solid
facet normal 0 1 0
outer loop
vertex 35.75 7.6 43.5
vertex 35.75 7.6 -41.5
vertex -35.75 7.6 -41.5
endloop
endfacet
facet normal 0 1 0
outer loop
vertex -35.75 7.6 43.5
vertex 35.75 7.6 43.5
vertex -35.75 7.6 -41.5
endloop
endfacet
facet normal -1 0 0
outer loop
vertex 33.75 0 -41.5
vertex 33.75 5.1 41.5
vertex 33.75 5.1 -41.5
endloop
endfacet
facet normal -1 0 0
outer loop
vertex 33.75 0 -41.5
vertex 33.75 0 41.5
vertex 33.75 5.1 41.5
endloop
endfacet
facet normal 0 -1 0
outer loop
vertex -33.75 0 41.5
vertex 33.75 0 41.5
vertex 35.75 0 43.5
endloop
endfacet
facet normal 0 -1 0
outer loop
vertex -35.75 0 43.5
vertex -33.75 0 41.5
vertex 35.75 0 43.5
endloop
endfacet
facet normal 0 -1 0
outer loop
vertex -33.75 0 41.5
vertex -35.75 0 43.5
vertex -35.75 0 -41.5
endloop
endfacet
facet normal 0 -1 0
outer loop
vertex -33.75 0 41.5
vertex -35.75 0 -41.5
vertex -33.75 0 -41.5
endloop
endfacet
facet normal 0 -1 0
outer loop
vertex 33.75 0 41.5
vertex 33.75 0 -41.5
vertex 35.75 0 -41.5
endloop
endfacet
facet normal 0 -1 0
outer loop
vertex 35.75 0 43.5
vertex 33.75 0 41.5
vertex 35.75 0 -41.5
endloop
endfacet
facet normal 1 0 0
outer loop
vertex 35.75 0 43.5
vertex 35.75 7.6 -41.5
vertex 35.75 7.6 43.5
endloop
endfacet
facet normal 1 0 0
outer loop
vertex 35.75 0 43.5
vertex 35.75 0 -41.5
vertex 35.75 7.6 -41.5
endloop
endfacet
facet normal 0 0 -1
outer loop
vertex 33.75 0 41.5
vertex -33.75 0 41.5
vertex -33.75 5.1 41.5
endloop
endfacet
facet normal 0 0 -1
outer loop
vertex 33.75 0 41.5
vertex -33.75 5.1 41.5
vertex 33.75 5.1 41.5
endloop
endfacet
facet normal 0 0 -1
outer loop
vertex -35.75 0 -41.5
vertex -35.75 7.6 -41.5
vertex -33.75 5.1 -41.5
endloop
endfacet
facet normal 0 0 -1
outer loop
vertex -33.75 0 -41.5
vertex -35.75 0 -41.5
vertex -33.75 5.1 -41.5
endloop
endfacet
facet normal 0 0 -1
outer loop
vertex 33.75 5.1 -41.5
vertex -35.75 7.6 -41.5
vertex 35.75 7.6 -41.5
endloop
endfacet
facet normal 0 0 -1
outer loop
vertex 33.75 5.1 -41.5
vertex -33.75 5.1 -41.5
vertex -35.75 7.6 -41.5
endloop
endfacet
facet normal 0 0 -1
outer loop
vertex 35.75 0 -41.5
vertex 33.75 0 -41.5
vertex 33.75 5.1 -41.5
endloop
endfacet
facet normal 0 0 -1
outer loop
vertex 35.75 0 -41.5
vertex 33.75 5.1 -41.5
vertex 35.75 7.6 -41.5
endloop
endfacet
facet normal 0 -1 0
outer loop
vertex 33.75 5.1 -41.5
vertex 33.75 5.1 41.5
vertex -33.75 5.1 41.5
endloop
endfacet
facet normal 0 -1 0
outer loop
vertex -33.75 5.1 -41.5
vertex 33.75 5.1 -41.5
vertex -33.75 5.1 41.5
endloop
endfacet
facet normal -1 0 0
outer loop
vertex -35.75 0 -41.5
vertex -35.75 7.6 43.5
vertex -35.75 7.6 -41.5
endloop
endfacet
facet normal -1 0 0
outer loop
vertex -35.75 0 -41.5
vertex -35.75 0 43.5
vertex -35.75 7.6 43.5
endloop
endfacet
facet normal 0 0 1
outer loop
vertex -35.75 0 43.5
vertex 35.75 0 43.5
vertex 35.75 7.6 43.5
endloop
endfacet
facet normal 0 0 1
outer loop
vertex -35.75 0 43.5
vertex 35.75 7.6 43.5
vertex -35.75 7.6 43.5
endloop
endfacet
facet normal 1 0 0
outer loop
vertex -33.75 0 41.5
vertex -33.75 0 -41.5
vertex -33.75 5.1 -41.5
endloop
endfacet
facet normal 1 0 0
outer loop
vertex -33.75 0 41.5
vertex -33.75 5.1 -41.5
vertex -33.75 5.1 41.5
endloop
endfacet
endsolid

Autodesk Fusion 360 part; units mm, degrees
sketch "Sketch1" plane through (0, 0, 0) normal (0, 1, 0) x (1, 0, 0)
  line L0 (-35.75, 41.5) -> (-33.75, 41.5)
  line L1 (-33.75, 41.5) -> (-33.75, -41.5)
  line L2 (-33.75, -41.5) -> (33.75, -41.5)
  line L3 (33.75, -41.5) -> (33.75, 41.5)
  line L4 (33.75, 41.5) -> (35.75, 41.5)
  line L5 (35.75, 41.5) -> (35.75, -43.5)
  line L6 (35.75, -43.5) -> (-35.75, -43.5)
  line L7 (-35.75, -43.5) -> (-35.75, 41.5)
  dimension "d1" = 2
  dimension "d2" = 2
  dimension "d3" = 2
  dimension "d4" = 67.5
  dimension "d5" = 83
  dimension "d6" = 33.75
  dimension "d7" = 41.5
extrude "Extrude1" add sketch "Sketch1" along normal blind 5.1
sketch "Sketch2" plane through (0, 5.1, 0) normal (0, 1, 0) x (-1, 0, 0)
  line L0 (35.75, 43.5) -> (-35.75, 43.5)
  line L1 (-35.75, 43.5) -> (-35.75, -41.5)
  line L2 (-35.75, -41.5) -> (-33.75, -41.5)
  line L3 (-33.75, -41.5) -> (-33.75, 41.5)
  line L4 (-33.75, 41.5) -> (33.75, 41.5)
  line L5 (33.75, 41.5) -> (33.75, -41.5)
  line L6 (33.75, -41.5) -> (35.75, -41.5)
  line L7 (35.75, -41.5) -> (35.75, 43.5)
  line L8 (35.75, 43.5) -> (-35.75, 43.5)
  line L9 (-35.75, 43.5) -> (-35.75, -41.5)
  line L10 (-35.75, -41.5) -> (35.75, -41.5)
  line L11 (35.75, -41.5) -> (35.75, 43.5)
extrude "Extrude2" add sketch "Sketch2" along normal blind 2.5
equation "d2 = d1"
equation "d3 = d1"
equation "d4 = 60 mm + 6 mm + 1.5 mm"
equation "d5 = 80 mm + 3 mm"
equation "d6 = d4 / 2"
equation "d7 = d5 / 2"
